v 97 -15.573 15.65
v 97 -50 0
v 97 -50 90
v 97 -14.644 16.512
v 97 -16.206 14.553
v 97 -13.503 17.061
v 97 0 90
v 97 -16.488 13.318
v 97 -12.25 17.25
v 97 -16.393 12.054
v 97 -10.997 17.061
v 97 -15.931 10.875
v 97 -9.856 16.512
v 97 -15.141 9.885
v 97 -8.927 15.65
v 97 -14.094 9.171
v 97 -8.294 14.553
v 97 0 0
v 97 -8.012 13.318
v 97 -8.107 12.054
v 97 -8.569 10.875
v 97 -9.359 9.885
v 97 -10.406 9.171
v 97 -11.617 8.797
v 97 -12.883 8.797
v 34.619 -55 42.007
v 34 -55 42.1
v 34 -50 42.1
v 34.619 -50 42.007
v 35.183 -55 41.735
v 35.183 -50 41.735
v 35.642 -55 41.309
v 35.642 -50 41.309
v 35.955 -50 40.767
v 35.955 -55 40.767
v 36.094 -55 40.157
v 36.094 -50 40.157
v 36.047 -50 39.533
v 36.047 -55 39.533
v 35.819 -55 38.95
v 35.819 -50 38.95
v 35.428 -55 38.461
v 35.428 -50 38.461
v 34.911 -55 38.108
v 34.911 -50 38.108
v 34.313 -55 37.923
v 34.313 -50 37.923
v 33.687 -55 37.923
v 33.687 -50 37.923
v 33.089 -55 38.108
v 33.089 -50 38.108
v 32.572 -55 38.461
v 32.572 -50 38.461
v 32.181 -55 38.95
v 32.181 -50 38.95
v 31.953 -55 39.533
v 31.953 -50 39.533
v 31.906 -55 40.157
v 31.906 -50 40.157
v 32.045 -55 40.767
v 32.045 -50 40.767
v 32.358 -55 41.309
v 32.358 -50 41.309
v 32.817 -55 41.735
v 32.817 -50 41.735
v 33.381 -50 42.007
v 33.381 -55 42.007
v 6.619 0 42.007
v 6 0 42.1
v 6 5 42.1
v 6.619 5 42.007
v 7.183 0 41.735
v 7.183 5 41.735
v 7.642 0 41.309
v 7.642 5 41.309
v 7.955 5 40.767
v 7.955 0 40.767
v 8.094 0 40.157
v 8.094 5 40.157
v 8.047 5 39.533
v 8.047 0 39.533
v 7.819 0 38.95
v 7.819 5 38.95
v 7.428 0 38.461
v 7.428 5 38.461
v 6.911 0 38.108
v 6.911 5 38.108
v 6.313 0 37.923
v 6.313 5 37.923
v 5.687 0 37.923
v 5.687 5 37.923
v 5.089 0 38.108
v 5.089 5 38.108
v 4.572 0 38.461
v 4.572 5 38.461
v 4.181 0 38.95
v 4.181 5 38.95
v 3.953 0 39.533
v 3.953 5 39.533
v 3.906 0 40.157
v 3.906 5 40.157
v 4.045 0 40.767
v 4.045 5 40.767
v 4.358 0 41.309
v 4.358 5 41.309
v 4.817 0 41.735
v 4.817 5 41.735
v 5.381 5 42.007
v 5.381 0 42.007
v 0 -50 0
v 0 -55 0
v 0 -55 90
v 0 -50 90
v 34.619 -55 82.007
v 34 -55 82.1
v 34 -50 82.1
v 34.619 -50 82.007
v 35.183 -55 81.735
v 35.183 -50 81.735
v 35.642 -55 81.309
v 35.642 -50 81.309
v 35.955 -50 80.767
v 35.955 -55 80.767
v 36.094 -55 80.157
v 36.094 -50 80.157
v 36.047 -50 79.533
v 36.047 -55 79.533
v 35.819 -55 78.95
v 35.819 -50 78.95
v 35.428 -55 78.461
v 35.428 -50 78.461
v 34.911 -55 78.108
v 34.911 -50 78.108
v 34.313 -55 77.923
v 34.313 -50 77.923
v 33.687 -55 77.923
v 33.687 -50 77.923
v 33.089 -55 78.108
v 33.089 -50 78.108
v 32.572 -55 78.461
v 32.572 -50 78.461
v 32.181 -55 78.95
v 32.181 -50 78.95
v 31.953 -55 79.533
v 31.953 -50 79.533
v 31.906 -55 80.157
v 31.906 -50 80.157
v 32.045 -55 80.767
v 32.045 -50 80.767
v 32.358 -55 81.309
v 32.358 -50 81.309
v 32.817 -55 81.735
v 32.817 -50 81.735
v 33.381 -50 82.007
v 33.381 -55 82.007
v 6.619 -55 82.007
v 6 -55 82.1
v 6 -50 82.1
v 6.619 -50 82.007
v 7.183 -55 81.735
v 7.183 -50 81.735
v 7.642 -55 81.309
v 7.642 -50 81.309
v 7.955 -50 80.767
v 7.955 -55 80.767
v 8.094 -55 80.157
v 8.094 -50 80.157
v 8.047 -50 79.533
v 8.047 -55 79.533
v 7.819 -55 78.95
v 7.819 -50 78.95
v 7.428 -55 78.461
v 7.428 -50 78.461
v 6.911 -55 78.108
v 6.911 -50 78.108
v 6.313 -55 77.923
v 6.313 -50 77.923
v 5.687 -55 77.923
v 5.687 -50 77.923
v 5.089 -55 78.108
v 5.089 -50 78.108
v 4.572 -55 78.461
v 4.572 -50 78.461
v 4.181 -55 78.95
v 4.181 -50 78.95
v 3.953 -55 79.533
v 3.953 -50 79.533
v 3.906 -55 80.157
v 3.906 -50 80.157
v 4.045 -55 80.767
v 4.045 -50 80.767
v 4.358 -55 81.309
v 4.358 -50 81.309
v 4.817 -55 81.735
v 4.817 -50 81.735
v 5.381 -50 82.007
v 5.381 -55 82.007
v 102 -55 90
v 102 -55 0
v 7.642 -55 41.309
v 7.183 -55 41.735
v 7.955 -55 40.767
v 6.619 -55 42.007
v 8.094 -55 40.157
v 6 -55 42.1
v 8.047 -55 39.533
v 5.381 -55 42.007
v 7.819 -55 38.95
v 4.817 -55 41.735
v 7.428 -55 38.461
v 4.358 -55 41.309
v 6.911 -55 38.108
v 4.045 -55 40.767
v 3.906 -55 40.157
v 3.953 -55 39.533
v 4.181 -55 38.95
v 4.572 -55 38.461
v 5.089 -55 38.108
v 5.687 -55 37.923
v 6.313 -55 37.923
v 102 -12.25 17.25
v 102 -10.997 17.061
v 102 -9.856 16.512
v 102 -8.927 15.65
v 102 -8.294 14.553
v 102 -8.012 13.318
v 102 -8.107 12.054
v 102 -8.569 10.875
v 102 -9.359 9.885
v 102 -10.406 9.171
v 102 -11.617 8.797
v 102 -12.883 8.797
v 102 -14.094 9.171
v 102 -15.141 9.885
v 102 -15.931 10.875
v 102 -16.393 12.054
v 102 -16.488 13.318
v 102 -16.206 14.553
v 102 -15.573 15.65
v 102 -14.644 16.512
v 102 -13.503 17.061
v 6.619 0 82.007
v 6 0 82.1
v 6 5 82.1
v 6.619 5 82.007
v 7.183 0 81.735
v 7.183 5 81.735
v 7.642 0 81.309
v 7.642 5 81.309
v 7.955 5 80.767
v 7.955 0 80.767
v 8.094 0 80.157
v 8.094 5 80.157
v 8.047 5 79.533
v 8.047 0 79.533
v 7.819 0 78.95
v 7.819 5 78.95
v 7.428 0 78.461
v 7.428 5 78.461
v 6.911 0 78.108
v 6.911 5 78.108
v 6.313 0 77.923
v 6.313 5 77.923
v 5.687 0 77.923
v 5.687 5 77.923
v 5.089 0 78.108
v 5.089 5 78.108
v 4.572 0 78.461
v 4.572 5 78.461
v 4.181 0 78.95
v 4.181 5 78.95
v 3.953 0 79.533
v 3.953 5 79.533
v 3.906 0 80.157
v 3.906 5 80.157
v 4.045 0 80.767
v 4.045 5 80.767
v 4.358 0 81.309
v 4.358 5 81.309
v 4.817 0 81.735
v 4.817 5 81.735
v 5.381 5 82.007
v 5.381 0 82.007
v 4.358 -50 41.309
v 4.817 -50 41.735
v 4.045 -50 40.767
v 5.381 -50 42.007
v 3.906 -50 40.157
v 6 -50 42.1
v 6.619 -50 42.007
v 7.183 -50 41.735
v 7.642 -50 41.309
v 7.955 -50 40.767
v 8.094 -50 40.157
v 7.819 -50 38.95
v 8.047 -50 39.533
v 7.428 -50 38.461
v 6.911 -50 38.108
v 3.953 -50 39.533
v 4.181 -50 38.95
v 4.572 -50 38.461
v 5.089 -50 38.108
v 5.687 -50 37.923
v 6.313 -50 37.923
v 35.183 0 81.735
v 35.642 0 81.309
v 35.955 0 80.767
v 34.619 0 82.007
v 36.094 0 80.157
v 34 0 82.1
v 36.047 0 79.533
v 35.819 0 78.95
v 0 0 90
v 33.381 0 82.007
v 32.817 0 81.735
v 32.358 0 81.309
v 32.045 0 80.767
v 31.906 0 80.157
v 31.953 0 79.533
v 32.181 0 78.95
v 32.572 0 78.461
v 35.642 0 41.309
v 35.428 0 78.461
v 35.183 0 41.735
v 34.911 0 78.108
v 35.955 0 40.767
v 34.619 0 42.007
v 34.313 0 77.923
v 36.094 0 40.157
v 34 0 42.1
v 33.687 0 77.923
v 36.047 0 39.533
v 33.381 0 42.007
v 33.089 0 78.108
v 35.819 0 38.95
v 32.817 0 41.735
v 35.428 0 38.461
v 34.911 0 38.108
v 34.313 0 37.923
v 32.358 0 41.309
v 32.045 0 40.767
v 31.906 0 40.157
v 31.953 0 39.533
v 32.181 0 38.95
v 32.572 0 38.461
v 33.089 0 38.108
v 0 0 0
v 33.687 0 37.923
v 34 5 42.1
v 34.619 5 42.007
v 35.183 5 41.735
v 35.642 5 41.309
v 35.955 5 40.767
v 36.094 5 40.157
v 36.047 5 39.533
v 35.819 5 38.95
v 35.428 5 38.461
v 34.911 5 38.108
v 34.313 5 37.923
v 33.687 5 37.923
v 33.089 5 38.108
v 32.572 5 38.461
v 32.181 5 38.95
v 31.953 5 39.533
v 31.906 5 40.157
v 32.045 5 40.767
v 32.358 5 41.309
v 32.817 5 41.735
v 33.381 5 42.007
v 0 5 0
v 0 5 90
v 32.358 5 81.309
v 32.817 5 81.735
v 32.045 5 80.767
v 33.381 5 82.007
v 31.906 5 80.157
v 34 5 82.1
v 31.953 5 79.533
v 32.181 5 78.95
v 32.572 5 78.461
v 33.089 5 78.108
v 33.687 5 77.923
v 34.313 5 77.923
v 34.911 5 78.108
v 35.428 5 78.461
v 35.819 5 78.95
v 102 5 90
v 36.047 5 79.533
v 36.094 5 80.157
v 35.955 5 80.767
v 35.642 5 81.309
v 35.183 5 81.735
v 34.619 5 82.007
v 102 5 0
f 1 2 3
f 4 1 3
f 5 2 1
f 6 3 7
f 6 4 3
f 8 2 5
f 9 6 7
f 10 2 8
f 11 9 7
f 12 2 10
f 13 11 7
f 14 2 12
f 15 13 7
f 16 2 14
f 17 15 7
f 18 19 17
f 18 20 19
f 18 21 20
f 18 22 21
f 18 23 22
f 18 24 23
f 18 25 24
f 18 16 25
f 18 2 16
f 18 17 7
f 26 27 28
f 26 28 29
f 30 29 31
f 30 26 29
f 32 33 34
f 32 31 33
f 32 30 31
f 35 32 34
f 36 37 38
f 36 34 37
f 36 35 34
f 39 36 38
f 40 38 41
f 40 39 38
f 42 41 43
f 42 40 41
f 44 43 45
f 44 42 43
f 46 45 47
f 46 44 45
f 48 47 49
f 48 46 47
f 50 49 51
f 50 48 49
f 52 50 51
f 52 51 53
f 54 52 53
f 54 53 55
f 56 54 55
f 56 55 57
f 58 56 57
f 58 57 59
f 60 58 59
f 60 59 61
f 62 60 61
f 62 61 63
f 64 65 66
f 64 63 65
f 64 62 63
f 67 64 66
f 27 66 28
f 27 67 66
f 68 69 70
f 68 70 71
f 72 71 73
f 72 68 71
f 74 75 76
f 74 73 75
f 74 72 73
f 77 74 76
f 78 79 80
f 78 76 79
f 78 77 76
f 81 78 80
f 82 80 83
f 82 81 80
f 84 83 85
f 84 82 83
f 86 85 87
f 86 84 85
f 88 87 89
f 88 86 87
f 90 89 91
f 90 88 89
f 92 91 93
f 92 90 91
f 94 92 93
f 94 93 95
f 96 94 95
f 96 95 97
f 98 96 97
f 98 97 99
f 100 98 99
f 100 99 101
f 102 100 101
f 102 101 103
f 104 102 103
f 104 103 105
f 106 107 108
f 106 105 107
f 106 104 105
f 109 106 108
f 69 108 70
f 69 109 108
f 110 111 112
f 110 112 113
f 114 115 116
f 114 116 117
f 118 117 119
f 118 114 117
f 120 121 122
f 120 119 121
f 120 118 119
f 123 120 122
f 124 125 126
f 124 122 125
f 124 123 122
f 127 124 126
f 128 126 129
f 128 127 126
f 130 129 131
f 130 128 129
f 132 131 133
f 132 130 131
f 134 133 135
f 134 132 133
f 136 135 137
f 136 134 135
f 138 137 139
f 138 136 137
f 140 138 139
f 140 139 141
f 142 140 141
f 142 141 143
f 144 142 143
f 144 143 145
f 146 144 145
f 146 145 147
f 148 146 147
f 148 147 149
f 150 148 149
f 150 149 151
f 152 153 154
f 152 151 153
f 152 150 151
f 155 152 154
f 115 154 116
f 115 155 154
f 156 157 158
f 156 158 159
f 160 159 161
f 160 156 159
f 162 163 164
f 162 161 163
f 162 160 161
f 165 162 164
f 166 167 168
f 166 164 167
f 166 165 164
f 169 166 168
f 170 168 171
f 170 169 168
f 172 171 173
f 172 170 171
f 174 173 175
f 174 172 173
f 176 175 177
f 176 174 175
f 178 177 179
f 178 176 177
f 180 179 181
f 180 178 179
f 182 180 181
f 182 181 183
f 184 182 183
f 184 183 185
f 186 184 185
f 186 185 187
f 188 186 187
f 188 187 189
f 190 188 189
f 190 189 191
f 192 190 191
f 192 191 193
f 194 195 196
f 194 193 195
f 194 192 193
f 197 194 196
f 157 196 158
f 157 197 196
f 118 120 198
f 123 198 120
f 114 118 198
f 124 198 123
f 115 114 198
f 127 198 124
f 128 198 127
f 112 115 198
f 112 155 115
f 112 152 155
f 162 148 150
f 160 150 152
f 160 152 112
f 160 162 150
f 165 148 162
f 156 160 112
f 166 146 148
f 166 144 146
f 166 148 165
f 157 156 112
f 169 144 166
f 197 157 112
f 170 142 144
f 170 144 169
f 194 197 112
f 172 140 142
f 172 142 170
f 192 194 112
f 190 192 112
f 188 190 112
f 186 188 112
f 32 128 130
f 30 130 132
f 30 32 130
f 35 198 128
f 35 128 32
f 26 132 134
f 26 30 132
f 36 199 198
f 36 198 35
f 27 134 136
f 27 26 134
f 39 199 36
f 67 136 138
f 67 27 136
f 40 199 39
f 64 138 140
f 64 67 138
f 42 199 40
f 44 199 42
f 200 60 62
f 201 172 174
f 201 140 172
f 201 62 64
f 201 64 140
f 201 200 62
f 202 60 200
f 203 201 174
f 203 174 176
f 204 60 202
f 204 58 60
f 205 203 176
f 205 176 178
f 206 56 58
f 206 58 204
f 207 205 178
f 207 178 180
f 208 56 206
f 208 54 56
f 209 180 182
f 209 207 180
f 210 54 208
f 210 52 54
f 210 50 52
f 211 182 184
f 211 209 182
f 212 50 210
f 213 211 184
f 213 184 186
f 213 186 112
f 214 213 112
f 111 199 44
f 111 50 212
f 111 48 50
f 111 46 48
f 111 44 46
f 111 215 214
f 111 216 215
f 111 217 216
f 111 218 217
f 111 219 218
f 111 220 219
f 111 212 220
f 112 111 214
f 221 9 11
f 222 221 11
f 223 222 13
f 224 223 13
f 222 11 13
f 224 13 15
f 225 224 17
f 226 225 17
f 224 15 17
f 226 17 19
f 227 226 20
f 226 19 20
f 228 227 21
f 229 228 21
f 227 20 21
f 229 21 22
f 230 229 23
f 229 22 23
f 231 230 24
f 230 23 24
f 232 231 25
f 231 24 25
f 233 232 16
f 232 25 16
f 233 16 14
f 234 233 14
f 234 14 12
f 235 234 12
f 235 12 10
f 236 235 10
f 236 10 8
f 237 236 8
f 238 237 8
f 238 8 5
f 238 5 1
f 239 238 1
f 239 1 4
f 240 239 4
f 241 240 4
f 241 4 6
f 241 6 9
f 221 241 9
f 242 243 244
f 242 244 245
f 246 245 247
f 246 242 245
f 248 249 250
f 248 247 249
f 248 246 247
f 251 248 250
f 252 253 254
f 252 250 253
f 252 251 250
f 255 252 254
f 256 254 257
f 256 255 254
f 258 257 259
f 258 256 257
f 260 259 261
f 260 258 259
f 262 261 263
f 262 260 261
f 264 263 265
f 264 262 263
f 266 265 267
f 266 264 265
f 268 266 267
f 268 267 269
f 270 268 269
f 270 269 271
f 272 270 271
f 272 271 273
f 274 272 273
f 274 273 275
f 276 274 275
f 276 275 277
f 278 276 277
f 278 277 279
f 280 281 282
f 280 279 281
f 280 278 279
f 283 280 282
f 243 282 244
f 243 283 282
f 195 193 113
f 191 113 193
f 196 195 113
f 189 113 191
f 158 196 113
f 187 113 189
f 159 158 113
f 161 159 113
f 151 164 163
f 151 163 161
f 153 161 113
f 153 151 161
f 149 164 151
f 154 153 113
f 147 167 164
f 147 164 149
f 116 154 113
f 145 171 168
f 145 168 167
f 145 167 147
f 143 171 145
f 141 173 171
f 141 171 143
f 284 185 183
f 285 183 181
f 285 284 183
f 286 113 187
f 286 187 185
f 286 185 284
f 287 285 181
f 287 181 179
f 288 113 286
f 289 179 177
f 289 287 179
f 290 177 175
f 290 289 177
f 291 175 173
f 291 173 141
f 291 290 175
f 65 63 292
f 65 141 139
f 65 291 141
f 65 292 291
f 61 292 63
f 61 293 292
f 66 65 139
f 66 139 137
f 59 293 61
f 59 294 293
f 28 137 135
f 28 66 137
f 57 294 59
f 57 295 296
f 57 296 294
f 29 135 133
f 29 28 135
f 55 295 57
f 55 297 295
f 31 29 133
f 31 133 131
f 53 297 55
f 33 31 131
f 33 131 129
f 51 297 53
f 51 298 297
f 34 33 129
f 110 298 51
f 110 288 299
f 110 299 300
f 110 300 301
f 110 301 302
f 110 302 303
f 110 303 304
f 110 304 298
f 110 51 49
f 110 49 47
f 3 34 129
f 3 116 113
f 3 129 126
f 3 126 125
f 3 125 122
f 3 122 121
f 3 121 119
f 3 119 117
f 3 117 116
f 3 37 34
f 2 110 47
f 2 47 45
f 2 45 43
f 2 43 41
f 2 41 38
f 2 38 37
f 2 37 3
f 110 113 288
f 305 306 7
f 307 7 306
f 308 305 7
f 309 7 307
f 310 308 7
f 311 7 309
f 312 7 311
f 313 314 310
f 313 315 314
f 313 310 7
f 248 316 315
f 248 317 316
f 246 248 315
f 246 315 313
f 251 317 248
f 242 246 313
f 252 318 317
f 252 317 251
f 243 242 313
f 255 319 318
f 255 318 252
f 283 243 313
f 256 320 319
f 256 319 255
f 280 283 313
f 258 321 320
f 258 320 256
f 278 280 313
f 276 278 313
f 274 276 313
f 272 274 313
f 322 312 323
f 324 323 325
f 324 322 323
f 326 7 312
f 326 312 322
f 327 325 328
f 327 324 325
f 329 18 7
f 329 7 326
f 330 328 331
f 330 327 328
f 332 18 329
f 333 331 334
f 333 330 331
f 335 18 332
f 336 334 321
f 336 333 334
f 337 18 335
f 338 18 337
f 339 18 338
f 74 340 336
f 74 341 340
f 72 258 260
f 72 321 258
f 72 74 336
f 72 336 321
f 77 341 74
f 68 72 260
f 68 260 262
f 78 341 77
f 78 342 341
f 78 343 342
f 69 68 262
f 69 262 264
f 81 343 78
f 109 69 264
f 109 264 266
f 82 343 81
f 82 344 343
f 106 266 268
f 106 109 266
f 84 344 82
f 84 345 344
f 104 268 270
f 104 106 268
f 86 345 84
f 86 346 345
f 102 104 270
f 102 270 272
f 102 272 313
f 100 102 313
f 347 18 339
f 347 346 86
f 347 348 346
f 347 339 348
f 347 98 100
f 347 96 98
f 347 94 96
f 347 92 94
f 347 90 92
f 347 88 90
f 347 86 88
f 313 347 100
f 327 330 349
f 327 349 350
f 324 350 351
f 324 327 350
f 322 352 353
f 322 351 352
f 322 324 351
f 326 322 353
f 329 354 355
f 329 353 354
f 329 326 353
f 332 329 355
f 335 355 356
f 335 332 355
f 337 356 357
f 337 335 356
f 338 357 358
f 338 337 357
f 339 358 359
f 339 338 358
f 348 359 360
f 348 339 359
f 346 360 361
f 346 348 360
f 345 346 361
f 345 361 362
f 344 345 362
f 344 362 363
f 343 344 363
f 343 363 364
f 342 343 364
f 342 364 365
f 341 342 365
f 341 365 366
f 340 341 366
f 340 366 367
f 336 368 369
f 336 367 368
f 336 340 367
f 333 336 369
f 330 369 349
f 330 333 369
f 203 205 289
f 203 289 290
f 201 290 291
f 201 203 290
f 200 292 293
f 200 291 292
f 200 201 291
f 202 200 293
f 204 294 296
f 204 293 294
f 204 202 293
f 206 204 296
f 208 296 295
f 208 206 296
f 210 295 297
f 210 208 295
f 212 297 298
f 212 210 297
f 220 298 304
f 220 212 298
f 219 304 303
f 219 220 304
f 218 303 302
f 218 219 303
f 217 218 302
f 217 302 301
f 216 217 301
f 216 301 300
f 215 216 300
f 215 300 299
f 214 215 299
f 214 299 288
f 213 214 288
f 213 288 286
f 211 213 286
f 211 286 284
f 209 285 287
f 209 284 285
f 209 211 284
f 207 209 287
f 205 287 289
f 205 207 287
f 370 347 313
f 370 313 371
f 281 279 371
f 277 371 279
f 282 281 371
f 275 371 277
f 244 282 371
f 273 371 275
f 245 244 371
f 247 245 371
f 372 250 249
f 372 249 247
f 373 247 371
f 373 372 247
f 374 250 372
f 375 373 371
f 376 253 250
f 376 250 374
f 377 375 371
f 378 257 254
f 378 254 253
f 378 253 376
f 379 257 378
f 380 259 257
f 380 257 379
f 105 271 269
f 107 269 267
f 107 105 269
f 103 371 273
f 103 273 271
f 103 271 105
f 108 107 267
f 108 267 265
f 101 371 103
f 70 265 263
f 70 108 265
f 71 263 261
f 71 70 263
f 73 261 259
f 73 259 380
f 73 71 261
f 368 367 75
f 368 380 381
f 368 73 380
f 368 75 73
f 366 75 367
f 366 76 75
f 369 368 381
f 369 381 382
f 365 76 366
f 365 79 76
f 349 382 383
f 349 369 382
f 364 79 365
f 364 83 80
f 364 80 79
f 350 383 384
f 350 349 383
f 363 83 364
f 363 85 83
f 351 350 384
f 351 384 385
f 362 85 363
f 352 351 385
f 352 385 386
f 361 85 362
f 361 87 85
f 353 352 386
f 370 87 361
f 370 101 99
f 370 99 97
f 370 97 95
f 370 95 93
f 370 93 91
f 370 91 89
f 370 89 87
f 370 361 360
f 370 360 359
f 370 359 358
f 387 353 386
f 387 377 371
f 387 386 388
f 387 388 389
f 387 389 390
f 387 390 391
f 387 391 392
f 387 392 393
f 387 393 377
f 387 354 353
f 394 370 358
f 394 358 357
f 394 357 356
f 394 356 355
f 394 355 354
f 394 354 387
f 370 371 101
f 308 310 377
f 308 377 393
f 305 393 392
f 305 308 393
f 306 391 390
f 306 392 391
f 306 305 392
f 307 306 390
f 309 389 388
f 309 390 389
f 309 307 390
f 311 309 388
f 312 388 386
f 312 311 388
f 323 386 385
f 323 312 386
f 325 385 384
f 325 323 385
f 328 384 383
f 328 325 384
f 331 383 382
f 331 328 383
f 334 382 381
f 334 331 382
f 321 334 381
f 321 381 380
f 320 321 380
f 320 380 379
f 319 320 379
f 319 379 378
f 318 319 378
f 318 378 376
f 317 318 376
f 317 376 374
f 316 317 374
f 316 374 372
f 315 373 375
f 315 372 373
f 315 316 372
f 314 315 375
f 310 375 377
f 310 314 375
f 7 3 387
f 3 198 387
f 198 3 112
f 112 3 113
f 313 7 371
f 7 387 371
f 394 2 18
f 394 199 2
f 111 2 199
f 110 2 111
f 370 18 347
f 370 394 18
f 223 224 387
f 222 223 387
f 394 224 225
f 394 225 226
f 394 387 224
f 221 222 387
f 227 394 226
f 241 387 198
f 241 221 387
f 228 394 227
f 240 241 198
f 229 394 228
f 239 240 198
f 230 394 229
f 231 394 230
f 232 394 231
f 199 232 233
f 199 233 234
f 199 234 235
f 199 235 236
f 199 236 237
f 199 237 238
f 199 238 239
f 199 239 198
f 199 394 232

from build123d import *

# Parameters (mm, degrees)
EXTRUDE_1_DEPTH         = 90
CUT_EXTRUDE1_DEPTH      = 147.727638841
CUT_EXTRUDE1_DEPTH_BACK = 147.727638841
SKETCH1_R               = 2.1
SKETCH_2_R              = 4.25
CUT_EXTRUDE_1_DEPTH     = 144.296894593


with BuildPart() as part:
    # 草图1 → 凸台-拉伸1 (new body)
    with BuildSketch(Plane.XY):
        Polygon((0, 0), (0, 5), (102, 5), (102, -55), (0, -55), (0, -50), (97, -50), (97, 0), align=None)
    extrude(amount=EXTRUDE_1_DEPTH)

    # Sketch1 → Cut-Extrude1 (cut, two sides: drawn at the far end of the back side and taken through both)
    with BuildSketch(Plane(origin=(0, 0, 0), x_dir=(1, 0, 0), z_dir=(0, 1, 0)).offset(-CUT_EXTRUDE1_DEPTH_BACK)):
        with Locations(Location((6, -40, 0), (0, 0, 270))):
            Circle(SKETCH1_R)
        with Locations(Location((34, -40, 0), (0, 0, 270))):
            Circle(SKETCH1_R)
        with Locations(Location((34, -80, 0), (0, 0, 270))):
            Circle(SKETCH1_R)
        with Locations(Location((6, -80, 0), (0, 0, 270))):
            Circle(SKETCH1_R)
    extrude(amount=CUT_EXTRUDE1_DEPTH + CUT_EXTRUDE1_DEPTH_BACK, mode=Mode.SUBTRACT)

    # 草图2 → 切除-拉伸1 (cut, through all)
    with BuildSketch(Plane.ZY.offset(-97)):
        with Locations((13, -12.25)):
            Circle(SKETCH_2_R)
    extrude(amount=-CUT_EXTRUDE_1_DEPTH, mode=Mode.SUBTRACT)


solid = part.part
